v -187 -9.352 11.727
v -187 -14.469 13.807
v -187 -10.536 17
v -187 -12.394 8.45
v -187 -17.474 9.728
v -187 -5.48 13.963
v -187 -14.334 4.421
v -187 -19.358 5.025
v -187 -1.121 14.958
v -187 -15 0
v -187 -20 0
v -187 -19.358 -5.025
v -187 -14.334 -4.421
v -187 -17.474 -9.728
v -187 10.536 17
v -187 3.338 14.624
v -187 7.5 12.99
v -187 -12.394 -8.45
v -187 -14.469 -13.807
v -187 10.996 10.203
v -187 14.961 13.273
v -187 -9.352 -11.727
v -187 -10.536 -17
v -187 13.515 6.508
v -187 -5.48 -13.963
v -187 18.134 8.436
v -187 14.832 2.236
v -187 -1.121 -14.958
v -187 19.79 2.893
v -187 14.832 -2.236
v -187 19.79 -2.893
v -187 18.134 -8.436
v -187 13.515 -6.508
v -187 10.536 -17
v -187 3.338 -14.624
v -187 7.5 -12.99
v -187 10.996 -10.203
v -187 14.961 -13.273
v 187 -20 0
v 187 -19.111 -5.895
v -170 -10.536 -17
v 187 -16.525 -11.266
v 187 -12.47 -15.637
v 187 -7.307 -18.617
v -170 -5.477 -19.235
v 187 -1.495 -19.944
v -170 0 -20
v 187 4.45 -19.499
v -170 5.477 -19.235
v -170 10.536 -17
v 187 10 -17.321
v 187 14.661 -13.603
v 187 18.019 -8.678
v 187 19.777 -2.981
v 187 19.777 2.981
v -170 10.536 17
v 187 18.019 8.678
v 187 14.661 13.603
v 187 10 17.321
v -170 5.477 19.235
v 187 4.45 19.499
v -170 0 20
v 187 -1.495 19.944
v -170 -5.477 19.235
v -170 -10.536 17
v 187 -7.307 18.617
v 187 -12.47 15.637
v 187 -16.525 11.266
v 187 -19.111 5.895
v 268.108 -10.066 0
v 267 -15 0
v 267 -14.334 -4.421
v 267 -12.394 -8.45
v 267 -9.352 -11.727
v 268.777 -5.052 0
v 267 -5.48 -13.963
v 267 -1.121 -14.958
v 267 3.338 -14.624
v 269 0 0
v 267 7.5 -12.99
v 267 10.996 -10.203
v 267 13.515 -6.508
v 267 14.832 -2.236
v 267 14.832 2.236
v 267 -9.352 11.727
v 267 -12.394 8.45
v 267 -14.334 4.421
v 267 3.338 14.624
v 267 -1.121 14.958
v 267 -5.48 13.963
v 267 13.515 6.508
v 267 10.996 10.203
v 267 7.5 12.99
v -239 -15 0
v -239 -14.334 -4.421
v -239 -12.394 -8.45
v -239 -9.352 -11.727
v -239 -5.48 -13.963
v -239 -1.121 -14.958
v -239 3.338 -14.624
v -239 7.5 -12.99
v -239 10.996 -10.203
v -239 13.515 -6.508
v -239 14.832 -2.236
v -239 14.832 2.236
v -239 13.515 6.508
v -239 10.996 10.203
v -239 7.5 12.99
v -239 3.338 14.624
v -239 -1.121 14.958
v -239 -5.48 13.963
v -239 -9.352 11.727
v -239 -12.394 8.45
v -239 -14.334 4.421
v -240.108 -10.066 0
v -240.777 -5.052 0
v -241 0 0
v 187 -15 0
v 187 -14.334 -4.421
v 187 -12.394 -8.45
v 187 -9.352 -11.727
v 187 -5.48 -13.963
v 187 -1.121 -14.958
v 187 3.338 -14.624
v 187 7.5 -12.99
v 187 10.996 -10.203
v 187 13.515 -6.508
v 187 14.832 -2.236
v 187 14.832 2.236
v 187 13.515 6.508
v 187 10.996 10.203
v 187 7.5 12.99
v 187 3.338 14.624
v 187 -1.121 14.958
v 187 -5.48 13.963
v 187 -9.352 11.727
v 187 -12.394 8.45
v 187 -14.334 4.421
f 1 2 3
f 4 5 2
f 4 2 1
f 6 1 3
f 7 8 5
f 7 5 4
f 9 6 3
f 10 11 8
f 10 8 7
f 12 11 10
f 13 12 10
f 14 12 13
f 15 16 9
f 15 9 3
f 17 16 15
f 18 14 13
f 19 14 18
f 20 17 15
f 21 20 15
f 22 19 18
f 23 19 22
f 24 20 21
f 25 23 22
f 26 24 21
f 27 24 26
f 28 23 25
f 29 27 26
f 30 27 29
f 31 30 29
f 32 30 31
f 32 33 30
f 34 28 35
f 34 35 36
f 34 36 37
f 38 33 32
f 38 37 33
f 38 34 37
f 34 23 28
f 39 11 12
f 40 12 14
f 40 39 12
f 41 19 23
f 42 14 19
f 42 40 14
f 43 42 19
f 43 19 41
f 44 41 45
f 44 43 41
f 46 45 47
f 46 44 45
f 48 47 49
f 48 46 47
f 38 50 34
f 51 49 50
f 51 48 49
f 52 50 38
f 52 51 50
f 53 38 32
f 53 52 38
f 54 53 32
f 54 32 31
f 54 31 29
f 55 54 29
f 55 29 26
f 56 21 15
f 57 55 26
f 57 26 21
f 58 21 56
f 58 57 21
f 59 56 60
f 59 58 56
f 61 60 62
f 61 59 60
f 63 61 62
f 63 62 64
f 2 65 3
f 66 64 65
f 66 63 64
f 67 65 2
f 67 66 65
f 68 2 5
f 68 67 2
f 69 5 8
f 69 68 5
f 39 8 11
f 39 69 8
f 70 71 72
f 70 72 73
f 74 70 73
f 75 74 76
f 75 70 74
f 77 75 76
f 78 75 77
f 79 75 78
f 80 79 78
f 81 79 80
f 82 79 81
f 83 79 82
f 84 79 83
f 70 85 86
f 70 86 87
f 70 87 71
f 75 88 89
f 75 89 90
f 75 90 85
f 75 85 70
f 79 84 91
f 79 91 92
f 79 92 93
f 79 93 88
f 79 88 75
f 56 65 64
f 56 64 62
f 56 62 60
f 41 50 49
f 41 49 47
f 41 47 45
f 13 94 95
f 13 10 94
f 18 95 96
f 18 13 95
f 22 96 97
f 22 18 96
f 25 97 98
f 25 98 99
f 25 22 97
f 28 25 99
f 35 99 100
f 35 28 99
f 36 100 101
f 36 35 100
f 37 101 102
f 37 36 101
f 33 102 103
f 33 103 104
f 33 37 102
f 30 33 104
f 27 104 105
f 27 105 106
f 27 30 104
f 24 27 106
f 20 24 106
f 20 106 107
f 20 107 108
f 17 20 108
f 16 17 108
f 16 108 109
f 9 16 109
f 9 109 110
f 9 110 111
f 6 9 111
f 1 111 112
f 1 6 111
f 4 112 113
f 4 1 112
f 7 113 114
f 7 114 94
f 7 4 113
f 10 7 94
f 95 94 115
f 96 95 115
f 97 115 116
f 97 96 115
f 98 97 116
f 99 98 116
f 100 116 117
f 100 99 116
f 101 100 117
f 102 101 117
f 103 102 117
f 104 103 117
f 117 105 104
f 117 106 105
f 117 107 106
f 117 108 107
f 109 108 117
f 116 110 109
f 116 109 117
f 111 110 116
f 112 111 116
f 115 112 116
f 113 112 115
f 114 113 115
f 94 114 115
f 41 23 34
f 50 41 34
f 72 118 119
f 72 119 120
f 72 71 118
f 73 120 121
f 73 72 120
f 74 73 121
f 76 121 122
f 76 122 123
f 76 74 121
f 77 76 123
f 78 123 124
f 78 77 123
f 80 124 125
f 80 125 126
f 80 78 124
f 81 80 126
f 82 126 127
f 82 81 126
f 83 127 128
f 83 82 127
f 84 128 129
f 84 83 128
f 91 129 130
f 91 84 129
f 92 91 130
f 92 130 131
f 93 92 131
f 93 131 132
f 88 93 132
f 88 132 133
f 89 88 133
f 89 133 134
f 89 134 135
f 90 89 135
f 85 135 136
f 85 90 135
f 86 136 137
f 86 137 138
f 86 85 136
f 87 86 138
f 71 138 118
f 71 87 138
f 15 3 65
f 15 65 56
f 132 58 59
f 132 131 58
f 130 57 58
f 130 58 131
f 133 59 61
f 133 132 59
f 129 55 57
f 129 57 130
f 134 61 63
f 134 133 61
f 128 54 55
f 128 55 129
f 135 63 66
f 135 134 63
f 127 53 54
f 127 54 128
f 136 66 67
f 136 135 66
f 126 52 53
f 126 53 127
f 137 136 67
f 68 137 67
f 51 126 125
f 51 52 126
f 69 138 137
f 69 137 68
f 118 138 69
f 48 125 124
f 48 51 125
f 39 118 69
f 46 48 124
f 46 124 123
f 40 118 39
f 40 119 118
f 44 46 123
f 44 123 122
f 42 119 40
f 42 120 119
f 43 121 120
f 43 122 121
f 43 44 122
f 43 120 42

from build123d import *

# Parameters (mm, degrees)
SKETCH2_W          = 13.807149041
SKETCH2_H          = 34.00821274
SKETCH2_W_2        = 8.154557823
SKETCH2_H_2        = 39.290142239
CUT_EXTRUDE1_DEPTH = 17


with BuildPart() as part:
    # Sketch1 → Revolve1 (revolve)
    with BuildSketch(Plane.XY, mode=Mode.PRIVATE) as revolve1_sk:
        with BuildLine():
            Line((-239, 15), (-187, 15))
            Line((-187, 15), (-187, 20))
            Line((-187, 20), (187, 20))
            Line((187, 20), (187, 15))
            Line((187, 15), (267, 15))
            ThreePointArc((267, 15), (268.497797314, 7.566372975), (269, 0))
            Line((269, 0), (-241, 0))
            ThreePointArc((-241, 0), (-240.497797314, 7.566372975), (-239, 15))
        make_face()
    revolve(revolve1_sk.sketch.rotate(Axis((-241, 0, 0), (1, 0, 0)), 180), axis=Axis((-241, 0, 0), (1, 0, 0)))

    # Sketch2 → Cut-Extrude1 (cut)
    with BuildSketch(Plane.ZY.offset(187)):
        with Locations((23.903574521, 0.880321583)):
            Rectangle(SKETCH2_W, SKETCH2_H)
        with Locations((-21.077278912, -2.316635745)):
            Rectangle(SKETCH2_W_2, SKETCH2_H_2)
    extrude(amount=-CUT_EXTRUDE1_DEPTH, mode=Mode.SUBTRACT)


solid = part.part
